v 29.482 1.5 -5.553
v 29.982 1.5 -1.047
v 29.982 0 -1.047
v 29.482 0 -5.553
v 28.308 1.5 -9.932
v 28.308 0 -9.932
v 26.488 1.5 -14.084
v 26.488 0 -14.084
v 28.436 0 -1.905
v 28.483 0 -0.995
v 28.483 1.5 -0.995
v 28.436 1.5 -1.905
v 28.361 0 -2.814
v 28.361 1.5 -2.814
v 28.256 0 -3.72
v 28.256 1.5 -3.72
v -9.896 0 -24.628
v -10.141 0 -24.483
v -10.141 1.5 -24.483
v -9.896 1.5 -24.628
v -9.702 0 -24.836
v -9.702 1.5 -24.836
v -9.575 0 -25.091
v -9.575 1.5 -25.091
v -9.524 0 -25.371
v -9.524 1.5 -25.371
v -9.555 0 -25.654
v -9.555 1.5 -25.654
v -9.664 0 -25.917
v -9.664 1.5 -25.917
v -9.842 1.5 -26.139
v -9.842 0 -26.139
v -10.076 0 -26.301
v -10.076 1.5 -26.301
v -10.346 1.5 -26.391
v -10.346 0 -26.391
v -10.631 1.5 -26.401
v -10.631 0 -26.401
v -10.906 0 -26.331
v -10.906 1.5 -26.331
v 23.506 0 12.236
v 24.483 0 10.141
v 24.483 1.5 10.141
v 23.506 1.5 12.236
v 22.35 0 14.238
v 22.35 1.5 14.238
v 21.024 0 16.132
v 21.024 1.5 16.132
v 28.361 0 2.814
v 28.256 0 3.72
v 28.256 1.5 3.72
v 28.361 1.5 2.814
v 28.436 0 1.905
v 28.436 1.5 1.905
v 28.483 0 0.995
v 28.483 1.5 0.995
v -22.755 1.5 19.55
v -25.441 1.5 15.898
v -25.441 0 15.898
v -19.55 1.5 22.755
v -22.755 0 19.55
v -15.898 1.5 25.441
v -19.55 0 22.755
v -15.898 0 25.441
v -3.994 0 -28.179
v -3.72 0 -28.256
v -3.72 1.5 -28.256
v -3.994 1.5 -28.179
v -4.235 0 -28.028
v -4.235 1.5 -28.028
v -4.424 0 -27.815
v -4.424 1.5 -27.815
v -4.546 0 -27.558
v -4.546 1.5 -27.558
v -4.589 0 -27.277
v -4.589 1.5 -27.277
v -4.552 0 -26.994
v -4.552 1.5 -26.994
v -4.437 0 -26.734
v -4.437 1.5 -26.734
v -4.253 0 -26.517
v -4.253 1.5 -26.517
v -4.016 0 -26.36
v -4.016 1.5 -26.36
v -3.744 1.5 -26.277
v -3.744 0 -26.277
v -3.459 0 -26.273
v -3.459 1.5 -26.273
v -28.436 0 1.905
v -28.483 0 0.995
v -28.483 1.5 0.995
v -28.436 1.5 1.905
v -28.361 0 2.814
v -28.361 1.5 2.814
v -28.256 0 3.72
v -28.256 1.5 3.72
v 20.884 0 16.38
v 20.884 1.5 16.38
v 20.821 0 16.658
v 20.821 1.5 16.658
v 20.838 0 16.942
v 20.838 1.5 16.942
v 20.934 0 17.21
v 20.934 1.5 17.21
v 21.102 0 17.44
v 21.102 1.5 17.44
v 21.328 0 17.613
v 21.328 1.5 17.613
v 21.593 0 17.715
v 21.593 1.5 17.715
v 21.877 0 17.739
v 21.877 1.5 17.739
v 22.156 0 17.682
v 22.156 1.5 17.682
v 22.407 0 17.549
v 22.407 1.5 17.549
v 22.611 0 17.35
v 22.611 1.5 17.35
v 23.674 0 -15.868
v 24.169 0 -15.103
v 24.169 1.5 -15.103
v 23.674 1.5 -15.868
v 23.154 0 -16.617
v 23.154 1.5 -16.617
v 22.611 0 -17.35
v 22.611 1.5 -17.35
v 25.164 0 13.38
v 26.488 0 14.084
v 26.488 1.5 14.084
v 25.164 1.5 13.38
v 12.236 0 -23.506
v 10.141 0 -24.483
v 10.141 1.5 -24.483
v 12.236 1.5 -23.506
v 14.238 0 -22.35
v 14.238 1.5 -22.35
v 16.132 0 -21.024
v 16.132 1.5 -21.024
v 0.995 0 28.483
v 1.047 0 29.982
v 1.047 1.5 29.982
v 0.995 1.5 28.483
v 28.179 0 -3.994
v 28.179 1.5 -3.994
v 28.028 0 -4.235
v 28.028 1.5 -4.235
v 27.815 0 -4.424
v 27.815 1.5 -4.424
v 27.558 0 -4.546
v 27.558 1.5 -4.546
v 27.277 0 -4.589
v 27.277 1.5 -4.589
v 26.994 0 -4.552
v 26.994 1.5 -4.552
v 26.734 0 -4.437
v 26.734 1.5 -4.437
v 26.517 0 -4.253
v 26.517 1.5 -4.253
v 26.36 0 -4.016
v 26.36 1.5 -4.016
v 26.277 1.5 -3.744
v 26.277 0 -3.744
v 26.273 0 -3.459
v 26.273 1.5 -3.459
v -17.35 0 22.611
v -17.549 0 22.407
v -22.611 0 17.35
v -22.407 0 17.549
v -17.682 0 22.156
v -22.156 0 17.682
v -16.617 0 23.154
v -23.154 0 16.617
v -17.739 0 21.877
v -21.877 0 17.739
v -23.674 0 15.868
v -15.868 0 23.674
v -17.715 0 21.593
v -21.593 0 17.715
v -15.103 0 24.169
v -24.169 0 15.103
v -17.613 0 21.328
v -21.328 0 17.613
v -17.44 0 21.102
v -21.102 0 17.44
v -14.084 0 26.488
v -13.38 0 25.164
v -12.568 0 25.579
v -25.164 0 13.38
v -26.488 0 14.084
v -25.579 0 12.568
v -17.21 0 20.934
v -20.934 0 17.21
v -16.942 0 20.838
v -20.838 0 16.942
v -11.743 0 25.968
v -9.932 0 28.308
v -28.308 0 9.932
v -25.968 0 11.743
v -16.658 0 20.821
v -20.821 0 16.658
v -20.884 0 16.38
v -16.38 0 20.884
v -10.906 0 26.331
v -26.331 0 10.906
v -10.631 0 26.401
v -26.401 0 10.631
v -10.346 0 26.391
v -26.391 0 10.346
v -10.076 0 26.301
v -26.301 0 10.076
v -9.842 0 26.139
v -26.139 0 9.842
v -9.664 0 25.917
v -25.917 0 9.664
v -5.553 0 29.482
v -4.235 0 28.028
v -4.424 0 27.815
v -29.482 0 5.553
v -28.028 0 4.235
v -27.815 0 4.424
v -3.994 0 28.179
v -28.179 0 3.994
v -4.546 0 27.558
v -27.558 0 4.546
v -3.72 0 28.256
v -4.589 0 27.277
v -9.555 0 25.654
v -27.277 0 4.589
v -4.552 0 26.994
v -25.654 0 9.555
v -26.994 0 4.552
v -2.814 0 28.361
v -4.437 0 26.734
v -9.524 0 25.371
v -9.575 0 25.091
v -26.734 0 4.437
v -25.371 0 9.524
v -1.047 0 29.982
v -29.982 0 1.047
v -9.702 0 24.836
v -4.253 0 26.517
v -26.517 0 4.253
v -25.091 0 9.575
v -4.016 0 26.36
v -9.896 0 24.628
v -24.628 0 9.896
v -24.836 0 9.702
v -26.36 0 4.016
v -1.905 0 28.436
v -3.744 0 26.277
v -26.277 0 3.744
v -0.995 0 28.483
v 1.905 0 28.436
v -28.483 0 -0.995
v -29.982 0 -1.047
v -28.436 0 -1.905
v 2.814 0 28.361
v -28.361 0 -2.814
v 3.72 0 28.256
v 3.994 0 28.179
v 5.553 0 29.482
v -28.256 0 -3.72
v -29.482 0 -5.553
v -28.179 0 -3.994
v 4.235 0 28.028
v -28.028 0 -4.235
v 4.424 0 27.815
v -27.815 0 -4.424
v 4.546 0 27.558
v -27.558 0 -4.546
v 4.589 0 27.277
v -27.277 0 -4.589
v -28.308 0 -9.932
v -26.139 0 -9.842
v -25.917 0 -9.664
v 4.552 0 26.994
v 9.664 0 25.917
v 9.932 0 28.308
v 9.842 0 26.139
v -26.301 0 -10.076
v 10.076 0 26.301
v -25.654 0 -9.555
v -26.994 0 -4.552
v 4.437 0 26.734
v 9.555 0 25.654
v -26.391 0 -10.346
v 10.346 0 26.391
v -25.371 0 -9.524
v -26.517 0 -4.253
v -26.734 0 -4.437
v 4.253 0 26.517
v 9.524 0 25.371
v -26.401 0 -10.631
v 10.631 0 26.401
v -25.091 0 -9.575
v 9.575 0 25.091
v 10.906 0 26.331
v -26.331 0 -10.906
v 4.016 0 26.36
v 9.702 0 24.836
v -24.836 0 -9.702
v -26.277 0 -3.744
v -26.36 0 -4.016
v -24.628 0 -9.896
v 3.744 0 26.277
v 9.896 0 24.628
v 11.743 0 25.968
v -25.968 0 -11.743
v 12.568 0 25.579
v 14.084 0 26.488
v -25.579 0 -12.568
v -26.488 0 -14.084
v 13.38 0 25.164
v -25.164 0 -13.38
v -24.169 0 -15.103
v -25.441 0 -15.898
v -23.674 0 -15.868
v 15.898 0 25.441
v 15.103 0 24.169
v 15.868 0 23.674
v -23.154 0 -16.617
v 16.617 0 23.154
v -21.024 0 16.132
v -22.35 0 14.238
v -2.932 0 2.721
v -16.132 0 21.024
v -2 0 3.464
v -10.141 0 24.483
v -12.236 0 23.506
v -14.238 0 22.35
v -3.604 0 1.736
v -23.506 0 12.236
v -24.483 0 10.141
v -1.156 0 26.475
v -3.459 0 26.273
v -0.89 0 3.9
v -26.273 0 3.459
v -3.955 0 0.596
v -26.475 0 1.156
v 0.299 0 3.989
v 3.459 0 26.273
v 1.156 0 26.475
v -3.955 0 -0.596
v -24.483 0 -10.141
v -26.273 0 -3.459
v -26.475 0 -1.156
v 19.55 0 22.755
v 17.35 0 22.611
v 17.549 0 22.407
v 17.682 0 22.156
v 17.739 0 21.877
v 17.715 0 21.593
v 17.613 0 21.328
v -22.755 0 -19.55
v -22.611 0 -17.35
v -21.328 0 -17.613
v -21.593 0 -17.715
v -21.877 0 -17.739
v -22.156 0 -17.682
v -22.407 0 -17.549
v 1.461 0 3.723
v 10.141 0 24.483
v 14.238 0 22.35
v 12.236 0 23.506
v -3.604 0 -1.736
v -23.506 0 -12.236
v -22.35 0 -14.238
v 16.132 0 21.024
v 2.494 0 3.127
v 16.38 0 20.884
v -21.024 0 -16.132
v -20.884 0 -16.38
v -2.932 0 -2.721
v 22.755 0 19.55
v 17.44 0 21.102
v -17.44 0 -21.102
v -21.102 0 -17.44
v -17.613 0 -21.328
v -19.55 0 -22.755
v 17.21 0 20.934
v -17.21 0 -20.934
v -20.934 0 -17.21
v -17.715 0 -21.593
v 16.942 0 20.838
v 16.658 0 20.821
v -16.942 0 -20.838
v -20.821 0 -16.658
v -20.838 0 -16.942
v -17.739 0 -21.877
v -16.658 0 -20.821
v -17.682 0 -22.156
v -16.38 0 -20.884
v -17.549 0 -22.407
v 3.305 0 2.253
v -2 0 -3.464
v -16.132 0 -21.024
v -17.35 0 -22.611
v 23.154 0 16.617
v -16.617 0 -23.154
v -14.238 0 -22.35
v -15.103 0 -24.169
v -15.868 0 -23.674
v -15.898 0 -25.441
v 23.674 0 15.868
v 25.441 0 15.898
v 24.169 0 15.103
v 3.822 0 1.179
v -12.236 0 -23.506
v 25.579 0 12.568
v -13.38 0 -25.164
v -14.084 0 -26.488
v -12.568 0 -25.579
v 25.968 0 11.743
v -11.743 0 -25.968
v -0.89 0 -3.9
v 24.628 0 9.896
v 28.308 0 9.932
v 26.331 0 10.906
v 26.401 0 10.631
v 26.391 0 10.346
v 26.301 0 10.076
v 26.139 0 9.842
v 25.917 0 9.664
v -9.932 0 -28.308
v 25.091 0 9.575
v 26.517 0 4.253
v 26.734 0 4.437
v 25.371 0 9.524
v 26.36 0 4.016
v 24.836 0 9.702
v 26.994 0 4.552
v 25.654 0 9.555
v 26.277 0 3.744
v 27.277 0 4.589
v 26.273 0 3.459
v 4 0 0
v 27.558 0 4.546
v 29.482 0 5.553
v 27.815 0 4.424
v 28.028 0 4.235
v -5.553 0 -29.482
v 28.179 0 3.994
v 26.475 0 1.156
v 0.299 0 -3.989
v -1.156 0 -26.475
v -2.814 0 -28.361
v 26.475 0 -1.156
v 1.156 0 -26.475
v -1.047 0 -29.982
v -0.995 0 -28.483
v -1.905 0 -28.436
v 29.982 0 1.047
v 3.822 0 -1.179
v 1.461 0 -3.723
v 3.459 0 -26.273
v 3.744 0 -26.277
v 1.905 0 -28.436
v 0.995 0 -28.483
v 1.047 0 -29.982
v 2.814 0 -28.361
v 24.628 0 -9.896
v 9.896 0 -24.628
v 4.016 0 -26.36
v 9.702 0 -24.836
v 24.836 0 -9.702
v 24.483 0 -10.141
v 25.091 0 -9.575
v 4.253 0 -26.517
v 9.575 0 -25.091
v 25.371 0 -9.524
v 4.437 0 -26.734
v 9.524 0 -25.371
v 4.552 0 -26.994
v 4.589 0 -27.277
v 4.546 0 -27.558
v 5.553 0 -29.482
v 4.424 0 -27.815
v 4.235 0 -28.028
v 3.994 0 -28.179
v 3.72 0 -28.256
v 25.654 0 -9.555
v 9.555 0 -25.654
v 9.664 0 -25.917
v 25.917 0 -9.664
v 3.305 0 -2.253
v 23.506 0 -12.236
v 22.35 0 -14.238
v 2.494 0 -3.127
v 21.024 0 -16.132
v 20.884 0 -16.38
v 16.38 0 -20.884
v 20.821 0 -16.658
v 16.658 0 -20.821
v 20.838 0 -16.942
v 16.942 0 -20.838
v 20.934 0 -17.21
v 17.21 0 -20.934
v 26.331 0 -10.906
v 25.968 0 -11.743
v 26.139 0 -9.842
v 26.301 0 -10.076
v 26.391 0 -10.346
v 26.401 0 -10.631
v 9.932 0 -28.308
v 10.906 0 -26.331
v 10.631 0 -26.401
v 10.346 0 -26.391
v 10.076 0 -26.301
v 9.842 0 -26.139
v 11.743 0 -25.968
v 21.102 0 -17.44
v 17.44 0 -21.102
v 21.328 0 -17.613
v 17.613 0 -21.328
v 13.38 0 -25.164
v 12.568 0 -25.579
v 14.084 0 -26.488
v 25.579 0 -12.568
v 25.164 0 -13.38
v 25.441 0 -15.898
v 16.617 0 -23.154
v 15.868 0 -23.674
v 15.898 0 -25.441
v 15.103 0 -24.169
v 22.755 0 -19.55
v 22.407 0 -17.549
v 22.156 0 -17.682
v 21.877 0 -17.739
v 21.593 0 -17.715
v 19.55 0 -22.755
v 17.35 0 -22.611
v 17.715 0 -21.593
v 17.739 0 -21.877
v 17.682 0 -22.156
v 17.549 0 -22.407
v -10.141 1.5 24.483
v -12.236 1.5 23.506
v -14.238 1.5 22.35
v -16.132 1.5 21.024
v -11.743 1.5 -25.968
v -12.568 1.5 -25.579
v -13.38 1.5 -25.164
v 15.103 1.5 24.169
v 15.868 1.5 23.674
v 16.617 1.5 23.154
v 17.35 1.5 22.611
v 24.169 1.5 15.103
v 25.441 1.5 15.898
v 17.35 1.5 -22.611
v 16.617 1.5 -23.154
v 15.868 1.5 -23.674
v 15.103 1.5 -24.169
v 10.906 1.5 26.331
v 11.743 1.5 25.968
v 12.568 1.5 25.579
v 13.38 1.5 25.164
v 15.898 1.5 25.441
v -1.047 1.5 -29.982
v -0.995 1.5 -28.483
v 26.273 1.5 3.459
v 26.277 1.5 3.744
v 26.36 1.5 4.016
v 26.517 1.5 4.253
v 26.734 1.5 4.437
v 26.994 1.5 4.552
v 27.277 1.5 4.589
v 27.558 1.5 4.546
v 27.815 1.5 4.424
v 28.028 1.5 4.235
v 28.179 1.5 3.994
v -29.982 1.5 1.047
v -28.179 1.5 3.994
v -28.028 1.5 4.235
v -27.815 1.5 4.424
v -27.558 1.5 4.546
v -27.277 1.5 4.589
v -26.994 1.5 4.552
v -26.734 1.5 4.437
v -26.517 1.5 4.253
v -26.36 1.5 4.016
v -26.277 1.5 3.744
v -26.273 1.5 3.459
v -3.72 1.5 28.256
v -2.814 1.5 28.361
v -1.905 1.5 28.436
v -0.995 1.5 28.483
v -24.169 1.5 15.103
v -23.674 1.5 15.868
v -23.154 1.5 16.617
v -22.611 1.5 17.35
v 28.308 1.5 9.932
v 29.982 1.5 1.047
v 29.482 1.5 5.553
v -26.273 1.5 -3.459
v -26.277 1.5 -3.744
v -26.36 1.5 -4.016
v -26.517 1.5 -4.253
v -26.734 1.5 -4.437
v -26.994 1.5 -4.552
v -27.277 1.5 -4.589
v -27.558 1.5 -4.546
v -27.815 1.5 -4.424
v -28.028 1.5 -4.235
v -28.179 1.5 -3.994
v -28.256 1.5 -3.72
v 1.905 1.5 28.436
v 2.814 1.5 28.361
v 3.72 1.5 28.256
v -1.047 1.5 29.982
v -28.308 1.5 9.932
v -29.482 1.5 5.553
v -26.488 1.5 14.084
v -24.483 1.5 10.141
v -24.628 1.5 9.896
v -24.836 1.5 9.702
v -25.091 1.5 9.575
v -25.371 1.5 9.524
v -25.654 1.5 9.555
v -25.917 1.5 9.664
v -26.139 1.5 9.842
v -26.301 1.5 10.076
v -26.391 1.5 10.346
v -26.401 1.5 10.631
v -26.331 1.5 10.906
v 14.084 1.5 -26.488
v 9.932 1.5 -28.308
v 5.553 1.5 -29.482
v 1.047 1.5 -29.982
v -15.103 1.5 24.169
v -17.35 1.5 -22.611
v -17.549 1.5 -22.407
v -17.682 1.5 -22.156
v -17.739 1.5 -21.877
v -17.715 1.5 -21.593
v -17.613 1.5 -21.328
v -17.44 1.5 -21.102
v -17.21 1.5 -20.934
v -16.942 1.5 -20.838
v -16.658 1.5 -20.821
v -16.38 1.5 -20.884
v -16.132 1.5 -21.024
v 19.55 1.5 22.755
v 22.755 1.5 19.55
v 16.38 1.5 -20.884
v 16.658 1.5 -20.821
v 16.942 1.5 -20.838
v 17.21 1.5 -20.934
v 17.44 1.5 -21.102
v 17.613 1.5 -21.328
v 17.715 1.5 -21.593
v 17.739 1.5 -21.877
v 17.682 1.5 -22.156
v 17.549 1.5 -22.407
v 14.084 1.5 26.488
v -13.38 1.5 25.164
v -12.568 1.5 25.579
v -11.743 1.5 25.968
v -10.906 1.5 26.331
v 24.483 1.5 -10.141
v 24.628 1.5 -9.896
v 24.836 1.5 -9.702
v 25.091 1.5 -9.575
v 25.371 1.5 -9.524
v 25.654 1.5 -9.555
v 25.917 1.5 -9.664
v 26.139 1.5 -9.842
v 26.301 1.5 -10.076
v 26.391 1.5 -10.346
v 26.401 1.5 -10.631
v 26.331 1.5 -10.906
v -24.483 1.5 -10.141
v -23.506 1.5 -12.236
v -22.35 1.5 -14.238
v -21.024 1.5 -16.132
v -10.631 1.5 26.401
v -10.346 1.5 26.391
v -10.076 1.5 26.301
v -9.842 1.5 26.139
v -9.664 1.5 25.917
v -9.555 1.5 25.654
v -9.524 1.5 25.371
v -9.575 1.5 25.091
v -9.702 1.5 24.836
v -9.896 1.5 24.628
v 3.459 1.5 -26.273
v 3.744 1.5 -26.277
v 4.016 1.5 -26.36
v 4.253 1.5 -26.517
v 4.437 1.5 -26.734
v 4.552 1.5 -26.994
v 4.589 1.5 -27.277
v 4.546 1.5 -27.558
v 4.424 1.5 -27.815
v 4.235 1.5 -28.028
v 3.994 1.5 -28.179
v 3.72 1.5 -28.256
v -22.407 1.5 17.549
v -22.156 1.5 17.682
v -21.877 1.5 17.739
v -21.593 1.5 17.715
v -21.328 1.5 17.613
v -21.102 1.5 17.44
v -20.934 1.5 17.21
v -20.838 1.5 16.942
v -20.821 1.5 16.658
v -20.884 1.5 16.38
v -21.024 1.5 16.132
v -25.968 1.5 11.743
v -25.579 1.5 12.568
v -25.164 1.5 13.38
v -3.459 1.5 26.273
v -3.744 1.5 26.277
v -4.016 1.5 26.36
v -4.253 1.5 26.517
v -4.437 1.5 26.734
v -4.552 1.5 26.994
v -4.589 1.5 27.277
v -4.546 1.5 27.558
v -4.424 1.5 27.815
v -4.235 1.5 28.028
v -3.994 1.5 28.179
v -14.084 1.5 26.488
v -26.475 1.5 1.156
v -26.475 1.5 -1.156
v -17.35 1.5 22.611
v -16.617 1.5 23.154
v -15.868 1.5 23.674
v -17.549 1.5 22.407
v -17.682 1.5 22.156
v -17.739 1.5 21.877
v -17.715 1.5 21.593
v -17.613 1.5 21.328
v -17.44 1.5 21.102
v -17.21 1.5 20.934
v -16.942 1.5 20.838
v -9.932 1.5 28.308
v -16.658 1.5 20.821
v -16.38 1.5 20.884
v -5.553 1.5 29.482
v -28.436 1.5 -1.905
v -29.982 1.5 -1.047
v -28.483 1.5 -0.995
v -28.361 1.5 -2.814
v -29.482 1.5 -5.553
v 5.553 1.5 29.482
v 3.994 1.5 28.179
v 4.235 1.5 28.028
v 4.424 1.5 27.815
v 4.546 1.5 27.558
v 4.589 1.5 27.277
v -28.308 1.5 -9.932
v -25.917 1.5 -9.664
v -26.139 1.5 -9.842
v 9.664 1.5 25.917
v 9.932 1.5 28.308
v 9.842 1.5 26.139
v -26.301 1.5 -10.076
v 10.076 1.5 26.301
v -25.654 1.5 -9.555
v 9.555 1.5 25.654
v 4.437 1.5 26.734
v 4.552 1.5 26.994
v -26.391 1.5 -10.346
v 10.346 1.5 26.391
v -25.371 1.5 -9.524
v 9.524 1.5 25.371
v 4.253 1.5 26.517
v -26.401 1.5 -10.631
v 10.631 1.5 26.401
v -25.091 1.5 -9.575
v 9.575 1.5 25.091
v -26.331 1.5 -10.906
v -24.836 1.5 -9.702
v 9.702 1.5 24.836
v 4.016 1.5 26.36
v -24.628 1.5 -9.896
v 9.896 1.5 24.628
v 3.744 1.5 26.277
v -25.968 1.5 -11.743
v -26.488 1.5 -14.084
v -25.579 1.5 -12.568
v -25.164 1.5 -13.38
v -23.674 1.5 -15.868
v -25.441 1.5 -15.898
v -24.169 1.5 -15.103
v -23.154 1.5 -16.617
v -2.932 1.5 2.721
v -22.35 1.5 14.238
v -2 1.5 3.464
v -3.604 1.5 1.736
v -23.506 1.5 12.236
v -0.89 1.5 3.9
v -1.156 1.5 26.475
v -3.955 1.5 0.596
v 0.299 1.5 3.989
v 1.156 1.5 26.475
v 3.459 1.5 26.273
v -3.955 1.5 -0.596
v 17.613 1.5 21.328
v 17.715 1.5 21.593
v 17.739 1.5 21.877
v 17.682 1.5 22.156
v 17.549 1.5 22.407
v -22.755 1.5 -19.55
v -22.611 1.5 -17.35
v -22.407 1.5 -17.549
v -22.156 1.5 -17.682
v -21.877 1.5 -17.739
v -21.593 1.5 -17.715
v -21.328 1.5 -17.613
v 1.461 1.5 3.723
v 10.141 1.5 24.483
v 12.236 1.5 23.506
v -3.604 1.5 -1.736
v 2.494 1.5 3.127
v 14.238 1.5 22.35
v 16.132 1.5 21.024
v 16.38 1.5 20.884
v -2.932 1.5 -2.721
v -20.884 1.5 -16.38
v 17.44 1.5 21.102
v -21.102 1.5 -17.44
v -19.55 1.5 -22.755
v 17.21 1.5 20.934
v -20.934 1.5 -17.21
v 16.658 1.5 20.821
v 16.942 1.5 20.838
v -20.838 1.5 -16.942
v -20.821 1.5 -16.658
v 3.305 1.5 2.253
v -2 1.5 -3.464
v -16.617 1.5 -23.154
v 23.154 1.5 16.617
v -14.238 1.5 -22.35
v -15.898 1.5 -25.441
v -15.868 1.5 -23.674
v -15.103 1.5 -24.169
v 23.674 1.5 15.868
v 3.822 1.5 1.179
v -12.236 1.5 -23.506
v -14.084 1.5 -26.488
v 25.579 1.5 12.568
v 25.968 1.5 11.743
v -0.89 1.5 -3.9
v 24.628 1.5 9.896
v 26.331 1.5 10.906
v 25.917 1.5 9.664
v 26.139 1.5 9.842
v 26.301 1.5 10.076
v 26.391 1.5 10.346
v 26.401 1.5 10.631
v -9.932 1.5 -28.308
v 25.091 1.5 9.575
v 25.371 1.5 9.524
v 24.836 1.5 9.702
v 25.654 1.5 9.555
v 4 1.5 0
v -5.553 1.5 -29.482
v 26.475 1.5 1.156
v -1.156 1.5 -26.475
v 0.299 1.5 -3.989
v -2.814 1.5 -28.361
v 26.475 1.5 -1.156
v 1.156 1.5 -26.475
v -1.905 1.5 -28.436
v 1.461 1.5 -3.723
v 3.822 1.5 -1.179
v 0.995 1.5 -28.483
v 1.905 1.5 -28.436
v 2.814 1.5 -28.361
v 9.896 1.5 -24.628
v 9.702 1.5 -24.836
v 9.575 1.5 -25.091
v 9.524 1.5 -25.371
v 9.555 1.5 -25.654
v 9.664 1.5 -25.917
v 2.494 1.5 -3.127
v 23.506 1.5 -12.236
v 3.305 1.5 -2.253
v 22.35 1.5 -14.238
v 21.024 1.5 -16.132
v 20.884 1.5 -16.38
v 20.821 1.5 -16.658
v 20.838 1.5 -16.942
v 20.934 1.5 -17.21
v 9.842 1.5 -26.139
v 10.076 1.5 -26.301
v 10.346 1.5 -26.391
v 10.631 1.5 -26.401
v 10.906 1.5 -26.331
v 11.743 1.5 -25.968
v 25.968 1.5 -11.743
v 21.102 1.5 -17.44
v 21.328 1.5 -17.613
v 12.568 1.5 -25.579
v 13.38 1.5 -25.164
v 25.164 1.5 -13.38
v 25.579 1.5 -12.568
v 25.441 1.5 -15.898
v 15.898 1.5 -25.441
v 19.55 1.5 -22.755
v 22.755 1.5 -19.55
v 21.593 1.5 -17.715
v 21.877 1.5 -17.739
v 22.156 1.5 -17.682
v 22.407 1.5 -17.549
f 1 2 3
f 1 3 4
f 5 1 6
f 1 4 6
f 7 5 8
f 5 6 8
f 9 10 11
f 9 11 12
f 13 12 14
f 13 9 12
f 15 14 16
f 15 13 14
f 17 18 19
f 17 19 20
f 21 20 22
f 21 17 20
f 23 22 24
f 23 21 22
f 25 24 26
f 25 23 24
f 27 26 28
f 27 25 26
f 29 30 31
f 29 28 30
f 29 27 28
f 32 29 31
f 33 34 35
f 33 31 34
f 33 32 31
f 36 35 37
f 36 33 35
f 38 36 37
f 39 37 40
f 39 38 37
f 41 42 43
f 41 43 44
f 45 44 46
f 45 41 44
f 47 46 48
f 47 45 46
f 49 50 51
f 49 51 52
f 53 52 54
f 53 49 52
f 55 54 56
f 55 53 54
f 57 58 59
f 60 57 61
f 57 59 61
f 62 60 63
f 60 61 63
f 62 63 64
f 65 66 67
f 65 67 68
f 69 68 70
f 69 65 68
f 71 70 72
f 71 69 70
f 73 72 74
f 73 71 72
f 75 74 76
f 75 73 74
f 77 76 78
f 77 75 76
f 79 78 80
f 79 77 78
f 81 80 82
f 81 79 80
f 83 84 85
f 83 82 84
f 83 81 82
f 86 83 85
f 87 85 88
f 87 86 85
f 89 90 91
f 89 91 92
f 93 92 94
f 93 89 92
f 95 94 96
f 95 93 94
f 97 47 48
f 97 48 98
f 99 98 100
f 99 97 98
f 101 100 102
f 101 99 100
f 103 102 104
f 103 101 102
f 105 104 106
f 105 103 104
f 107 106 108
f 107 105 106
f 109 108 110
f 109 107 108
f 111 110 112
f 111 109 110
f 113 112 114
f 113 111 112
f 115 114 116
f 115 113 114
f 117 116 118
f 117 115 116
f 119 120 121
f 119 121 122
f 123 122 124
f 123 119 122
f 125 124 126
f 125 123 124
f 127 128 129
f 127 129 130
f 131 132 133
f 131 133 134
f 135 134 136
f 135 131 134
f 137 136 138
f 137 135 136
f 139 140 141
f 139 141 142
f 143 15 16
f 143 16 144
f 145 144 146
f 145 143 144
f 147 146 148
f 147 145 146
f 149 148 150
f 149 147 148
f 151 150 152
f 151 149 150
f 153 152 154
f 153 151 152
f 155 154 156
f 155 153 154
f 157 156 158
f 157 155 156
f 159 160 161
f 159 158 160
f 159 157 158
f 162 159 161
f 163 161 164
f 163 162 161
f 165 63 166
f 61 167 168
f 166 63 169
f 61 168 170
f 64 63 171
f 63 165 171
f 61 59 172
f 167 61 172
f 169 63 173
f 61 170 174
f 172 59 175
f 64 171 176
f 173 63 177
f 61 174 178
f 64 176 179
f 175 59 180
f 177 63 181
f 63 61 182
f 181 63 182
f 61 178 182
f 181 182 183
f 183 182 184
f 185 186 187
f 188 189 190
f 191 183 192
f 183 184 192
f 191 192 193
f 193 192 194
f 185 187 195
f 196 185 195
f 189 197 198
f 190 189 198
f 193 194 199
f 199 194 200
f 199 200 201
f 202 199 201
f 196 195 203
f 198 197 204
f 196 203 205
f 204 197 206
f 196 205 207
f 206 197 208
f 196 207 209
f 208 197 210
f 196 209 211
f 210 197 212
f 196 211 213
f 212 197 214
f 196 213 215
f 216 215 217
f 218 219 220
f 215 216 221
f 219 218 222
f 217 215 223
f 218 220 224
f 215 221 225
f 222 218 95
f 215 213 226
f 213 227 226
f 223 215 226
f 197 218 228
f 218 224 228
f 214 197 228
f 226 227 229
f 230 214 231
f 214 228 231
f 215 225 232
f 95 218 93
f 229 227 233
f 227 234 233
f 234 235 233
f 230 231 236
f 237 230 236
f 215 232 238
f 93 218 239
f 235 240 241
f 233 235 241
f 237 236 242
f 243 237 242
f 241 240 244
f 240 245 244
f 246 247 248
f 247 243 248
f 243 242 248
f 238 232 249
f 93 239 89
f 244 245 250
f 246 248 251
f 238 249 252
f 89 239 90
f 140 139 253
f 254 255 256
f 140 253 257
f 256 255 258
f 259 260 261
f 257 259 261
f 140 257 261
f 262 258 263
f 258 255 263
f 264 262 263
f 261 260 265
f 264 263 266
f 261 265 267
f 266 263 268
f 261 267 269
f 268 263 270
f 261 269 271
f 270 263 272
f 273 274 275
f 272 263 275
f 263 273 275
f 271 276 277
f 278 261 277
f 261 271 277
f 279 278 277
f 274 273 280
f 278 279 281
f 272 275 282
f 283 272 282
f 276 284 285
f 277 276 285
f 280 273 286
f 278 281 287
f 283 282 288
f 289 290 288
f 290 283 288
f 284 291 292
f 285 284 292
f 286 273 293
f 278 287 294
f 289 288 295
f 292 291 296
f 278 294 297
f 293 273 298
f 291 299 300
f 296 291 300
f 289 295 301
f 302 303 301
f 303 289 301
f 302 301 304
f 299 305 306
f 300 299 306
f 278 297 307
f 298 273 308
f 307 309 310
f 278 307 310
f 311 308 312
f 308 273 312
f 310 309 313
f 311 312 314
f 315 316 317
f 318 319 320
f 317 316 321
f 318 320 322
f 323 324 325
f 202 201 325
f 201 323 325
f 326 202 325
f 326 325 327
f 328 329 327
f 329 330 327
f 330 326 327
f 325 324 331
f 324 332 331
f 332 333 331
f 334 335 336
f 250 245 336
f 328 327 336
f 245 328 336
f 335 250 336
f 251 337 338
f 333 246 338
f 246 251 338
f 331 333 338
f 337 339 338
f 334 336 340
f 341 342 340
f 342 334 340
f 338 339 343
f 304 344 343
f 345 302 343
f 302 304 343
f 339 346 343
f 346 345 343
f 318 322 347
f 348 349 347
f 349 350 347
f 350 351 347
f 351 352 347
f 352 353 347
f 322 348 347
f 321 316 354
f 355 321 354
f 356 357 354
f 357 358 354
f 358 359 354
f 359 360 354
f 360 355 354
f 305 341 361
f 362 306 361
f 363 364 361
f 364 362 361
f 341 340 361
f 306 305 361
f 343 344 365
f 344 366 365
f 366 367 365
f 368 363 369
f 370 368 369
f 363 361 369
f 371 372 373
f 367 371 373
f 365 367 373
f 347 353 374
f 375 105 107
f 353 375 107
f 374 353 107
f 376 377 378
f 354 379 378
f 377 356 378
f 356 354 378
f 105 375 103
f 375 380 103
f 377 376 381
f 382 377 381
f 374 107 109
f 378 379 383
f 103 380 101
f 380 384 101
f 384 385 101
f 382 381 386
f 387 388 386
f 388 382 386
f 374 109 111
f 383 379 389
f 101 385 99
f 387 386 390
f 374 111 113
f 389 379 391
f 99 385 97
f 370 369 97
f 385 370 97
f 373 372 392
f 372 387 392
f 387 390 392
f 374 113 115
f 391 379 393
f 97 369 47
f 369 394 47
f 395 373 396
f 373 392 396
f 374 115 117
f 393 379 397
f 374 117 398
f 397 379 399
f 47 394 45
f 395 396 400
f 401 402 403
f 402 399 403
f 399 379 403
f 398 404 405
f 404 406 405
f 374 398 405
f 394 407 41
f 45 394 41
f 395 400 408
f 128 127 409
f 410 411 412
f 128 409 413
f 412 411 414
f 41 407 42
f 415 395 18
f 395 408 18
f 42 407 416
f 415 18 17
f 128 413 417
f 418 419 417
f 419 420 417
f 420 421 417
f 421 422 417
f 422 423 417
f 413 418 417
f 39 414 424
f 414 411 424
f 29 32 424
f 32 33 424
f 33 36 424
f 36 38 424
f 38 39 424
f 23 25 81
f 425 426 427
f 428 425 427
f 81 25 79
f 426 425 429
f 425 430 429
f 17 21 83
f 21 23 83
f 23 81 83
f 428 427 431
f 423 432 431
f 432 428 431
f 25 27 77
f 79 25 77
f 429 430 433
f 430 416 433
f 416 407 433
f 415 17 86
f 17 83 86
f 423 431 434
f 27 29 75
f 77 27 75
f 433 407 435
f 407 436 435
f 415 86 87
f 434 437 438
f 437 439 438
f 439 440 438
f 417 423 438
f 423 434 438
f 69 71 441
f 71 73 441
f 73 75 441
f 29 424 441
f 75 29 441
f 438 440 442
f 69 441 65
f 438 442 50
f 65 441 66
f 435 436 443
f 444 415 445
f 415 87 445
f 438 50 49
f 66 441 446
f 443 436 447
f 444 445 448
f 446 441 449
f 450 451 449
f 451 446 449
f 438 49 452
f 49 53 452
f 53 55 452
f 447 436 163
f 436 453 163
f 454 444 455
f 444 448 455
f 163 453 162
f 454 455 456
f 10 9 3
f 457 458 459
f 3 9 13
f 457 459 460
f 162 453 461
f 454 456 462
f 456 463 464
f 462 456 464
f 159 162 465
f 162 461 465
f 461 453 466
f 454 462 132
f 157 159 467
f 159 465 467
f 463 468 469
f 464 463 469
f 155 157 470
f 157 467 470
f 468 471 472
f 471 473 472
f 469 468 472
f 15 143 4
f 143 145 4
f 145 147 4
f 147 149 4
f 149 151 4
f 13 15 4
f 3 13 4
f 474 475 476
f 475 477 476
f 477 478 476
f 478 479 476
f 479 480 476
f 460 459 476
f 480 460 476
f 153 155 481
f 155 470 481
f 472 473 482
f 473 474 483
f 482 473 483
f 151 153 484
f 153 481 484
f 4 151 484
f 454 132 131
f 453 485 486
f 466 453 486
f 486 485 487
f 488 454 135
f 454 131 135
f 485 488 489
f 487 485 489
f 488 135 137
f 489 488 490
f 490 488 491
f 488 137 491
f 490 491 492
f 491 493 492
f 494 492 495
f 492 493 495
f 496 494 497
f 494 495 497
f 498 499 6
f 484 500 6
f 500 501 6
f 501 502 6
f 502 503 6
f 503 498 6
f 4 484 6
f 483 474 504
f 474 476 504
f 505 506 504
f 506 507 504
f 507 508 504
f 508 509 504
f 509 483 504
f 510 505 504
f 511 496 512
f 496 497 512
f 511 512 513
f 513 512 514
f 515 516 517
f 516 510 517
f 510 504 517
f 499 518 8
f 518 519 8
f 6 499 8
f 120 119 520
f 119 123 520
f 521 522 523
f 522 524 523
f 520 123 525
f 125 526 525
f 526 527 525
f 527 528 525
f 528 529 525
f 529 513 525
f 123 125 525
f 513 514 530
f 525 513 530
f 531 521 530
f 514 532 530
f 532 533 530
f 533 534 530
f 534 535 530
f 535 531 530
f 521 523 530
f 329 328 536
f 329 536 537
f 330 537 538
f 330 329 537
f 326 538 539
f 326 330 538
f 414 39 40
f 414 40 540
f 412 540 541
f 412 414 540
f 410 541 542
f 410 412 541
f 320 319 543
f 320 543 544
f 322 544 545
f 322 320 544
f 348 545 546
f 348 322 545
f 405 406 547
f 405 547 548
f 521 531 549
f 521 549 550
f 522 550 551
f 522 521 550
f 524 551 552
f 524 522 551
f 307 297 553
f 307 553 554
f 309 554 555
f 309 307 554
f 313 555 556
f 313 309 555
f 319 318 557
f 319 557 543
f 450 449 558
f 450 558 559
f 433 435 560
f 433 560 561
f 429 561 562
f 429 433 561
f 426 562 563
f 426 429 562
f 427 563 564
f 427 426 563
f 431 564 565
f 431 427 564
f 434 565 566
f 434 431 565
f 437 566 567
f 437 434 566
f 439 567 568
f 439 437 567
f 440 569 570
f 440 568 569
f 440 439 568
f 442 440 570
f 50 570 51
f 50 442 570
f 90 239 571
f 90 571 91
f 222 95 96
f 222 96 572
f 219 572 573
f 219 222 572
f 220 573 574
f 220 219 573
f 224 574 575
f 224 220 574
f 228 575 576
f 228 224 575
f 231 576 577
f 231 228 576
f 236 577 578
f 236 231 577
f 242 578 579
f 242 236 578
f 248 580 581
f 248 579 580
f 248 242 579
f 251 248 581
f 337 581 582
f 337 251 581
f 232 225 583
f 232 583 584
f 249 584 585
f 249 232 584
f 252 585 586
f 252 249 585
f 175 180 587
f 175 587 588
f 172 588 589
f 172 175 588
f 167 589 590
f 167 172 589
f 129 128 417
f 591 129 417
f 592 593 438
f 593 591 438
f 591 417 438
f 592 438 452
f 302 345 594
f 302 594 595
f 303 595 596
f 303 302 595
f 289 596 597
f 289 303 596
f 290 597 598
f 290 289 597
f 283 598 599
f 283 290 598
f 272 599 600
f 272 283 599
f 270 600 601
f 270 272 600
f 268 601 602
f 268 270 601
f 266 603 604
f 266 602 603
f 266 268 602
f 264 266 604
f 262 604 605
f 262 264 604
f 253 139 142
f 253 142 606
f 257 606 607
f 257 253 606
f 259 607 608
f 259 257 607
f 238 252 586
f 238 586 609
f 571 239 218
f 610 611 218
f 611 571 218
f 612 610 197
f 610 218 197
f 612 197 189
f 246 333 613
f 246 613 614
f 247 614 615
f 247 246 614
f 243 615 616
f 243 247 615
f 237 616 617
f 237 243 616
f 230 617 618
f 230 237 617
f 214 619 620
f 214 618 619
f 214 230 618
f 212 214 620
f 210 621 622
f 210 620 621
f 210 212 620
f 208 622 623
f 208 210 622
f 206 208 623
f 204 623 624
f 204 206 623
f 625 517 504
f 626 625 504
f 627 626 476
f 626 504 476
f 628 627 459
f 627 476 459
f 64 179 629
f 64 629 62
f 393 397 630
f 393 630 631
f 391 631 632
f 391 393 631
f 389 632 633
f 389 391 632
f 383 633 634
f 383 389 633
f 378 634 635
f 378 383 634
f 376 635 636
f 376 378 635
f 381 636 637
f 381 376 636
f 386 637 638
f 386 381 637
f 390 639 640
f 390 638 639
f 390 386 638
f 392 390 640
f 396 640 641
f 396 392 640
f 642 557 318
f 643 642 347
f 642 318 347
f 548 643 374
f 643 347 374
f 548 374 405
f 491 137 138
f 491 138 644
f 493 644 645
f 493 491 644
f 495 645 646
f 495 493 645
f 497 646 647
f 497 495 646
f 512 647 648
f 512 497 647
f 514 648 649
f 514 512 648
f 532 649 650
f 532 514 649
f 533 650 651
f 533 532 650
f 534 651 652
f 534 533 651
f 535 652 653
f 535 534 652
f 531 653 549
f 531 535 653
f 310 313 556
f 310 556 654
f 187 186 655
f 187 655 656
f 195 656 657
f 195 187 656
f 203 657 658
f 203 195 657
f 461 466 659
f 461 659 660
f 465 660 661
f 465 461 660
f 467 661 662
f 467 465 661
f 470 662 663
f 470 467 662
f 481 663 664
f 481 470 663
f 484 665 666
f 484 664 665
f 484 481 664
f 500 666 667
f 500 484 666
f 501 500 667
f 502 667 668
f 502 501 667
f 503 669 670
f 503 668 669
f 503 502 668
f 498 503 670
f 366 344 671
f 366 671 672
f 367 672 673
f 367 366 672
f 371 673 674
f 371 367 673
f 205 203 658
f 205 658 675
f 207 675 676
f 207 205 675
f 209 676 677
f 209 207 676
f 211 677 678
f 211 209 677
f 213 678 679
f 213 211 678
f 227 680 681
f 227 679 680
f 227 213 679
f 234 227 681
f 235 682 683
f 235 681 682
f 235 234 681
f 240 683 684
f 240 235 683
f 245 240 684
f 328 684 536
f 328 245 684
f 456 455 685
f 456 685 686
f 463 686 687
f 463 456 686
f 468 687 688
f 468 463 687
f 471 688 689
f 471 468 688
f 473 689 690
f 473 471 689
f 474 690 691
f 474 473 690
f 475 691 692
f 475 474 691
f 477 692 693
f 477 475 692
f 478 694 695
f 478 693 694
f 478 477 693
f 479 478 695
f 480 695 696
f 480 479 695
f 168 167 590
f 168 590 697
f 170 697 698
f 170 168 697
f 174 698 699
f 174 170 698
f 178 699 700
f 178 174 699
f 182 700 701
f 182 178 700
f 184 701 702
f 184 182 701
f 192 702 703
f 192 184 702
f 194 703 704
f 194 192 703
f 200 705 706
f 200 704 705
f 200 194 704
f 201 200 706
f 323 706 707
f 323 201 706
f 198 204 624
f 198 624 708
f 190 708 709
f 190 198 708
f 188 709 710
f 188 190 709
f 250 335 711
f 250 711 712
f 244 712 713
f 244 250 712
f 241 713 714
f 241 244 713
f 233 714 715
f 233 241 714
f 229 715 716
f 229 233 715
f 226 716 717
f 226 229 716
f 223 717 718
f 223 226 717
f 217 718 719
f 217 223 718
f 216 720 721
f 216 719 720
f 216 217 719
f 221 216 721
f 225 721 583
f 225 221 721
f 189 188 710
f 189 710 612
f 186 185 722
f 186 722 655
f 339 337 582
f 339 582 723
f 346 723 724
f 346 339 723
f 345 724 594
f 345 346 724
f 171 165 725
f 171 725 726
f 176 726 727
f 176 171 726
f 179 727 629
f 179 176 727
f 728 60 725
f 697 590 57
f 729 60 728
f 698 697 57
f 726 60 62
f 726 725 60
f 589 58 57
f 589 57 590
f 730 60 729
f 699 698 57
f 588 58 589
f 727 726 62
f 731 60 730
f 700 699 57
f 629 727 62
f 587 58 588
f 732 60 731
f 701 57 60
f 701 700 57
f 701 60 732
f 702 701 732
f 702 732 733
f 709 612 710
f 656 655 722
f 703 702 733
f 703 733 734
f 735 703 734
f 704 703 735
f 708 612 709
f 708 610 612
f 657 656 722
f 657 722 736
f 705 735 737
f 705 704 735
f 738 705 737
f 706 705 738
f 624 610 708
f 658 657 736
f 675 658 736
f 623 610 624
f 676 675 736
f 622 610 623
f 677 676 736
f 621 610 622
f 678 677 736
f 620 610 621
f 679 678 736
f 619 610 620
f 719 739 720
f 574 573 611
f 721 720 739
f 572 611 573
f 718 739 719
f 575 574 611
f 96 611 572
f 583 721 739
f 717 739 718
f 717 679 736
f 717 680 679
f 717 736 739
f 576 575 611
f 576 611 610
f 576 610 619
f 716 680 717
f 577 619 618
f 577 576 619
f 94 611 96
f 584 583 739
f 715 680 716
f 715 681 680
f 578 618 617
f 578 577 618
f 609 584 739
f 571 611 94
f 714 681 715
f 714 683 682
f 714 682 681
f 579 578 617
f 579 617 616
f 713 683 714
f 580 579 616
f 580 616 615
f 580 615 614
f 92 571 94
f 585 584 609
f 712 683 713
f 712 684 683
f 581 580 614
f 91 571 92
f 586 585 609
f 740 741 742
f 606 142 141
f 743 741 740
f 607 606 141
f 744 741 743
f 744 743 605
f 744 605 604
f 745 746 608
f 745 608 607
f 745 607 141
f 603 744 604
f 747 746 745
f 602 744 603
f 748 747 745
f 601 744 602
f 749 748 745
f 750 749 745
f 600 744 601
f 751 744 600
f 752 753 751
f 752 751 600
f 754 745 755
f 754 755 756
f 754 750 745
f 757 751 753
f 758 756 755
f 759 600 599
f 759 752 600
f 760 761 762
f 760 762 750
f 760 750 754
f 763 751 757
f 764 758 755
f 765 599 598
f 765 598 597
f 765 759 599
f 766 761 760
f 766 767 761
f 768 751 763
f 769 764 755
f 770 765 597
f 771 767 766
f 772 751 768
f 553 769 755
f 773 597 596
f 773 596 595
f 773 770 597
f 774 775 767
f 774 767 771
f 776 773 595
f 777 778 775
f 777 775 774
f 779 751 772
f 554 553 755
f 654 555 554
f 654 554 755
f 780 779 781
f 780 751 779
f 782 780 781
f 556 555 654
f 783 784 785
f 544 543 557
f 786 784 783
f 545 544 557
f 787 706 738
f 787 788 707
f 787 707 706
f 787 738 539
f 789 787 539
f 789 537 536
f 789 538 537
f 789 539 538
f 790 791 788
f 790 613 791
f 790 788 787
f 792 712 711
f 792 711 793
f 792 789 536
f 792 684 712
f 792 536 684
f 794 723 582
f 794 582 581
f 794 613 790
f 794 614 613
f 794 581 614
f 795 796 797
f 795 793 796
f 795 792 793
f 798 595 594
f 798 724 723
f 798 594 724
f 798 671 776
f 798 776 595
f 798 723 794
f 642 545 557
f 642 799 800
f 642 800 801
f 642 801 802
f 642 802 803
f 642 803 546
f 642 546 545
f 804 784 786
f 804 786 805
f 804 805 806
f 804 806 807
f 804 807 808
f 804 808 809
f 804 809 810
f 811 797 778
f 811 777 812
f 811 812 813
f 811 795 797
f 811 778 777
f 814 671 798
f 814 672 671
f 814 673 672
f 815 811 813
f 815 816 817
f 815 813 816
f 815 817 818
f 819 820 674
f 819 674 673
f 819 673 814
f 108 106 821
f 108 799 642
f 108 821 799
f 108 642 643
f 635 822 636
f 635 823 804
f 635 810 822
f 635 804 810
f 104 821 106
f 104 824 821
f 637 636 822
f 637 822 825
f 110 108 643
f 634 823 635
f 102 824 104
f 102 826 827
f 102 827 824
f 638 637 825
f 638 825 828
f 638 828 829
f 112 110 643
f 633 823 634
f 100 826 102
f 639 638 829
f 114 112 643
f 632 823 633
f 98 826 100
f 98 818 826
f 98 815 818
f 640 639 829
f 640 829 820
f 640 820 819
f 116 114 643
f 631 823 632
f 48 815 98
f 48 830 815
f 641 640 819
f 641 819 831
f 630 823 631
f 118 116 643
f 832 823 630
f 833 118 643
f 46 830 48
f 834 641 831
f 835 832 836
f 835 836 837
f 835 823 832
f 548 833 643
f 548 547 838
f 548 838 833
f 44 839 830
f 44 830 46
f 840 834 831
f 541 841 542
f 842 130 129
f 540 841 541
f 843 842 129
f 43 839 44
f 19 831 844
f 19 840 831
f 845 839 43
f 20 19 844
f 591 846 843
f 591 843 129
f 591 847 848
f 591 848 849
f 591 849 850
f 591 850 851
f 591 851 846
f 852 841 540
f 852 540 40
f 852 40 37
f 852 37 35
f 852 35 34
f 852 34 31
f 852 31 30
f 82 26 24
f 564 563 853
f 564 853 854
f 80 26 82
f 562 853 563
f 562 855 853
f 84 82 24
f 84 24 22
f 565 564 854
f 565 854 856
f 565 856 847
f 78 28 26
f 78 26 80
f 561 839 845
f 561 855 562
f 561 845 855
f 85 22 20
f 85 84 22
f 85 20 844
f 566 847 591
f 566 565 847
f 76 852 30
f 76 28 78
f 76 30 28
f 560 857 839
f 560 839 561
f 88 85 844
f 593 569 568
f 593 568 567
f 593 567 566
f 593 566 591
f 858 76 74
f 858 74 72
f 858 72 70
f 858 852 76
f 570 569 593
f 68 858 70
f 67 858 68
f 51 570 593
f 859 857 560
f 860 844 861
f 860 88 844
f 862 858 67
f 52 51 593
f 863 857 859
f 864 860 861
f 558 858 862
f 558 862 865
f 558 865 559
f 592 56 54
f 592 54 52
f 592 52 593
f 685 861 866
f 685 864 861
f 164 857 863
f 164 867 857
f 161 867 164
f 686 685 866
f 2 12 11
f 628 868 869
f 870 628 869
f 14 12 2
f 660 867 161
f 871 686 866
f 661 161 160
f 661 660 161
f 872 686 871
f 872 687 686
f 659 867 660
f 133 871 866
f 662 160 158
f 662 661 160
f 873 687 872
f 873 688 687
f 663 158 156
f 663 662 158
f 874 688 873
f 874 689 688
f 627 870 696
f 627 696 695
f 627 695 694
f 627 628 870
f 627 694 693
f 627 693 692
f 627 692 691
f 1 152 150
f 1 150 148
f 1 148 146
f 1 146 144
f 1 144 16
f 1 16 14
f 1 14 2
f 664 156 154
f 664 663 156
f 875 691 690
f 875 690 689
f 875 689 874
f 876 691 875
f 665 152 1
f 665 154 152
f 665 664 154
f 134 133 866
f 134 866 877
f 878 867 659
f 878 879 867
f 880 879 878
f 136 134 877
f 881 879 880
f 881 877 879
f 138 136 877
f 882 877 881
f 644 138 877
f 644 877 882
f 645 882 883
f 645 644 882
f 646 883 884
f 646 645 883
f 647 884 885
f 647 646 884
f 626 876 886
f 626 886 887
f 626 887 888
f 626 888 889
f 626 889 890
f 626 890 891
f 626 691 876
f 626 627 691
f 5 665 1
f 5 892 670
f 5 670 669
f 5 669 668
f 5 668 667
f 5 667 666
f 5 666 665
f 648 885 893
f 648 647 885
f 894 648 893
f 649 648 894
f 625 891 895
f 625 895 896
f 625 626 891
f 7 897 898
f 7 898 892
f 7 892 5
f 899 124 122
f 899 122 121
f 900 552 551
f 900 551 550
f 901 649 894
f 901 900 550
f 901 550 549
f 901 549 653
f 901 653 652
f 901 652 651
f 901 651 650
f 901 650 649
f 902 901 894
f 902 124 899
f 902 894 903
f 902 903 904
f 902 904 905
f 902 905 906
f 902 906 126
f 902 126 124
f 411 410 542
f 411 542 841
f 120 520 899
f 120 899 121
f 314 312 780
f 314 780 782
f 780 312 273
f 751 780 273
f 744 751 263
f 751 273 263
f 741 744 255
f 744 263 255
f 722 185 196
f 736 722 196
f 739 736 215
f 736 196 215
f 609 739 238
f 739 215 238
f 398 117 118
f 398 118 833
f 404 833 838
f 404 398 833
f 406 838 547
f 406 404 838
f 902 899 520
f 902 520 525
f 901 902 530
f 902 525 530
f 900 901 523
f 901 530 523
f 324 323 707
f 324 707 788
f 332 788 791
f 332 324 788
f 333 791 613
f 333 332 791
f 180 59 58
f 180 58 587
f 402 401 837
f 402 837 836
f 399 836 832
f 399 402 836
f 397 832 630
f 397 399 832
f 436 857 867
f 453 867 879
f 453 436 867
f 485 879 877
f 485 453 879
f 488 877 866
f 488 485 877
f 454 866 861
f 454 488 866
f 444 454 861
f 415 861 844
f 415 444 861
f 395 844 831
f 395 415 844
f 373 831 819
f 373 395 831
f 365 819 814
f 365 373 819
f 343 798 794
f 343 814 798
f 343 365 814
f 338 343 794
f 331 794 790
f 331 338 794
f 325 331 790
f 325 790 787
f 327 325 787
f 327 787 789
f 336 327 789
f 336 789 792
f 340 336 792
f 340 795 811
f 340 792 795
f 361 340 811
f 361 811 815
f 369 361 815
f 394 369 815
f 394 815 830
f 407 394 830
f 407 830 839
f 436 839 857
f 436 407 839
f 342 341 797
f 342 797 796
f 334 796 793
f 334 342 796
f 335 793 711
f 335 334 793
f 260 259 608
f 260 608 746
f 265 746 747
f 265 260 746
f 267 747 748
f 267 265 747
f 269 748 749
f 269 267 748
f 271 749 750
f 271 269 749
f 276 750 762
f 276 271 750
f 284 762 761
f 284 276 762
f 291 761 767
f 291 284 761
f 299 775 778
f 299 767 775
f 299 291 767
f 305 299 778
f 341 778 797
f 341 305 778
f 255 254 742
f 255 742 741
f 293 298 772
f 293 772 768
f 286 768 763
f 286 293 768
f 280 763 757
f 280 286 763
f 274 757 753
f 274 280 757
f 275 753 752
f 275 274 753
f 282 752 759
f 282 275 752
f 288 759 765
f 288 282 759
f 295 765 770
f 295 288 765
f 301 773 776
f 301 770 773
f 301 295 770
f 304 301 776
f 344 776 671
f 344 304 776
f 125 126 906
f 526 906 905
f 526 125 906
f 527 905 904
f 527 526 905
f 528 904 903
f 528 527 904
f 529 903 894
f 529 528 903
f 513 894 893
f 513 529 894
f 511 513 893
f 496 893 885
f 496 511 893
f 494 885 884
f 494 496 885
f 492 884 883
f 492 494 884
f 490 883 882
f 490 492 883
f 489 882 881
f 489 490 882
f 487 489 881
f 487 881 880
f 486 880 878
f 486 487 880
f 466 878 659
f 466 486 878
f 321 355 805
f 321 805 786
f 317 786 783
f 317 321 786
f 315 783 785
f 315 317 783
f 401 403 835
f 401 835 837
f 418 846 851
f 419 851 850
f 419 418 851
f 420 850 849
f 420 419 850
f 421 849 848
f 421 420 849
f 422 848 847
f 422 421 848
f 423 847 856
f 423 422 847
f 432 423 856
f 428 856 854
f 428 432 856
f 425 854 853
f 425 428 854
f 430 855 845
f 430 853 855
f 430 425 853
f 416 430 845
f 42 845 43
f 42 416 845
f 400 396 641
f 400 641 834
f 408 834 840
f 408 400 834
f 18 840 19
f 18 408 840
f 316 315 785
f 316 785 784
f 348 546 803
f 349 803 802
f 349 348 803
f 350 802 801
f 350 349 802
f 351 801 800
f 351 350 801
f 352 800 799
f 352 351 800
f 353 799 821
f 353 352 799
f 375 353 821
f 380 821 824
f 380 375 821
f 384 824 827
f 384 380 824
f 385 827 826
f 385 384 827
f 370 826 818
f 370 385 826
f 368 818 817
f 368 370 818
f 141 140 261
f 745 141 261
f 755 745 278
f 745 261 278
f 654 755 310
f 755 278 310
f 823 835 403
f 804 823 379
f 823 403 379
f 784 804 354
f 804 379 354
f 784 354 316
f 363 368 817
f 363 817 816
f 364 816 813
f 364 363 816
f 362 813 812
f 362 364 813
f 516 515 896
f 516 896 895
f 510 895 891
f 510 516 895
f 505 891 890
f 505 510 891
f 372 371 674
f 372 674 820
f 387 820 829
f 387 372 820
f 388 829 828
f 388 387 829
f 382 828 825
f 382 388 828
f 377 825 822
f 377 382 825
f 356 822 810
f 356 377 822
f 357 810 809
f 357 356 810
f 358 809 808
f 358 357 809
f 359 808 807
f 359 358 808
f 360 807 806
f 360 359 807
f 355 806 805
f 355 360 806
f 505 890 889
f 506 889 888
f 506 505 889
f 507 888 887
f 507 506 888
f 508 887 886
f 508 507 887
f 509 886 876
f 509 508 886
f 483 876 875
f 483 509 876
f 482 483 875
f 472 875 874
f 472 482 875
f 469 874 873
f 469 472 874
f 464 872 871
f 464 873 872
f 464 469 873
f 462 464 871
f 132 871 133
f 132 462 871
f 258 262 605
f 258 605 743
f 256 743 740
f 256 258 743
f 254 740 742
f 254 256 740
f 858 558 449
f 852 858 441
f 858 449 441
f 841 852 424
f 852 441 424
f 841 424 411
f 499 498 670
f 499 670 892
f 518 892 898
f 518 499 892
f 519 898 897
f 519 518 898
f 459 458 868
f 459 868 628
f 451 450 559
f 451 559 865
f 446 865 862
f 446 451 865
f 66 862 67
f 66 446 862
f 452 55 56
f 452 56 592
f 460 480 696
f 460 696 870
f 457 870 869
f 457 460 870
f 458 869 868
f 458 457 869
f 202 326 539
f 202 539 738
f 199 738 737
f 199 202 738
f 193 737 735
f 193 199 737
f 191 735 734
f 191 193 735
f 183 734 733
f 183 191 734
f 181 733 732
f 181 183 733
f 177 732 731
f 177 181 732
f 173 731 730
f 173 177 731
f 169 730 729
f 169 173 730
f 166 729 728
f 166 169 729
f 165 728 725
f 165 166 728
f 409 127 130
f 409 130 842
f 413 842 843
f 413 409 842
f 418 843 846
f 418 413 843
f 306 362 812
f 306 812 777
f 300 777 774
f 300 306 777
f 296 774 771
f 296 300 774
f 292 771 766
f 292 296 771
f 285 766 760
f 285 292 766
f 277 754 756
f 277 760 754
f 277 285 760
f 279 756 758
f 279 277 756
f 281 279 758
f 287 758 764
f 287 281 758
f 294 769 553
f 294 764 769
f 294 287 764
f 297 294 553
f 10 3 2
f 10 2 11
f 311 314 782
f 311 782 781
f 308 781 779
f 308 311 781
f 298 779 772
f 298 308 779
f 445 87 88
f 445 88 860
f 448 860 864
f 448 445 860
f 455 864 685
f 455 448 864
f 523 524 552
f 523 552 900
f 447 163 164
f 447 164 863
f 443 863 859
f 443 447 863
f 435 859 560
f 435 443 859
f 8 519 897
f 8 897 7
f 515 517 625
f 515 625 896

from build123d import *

# Parameters (mm, degrees)
SKETCH1_R         = 30
WHEEL_BLANK_DEPTH = 1.5
T_SLOT_DEPTH      = 2.5
CIRPATTERN1_COUNT = 12
SKETCH3_R         = 4
CENTER_HOLE_DEPTH = 6


with BuildPart() as part:
    # Sketch1 → Wheel Blank (new body)
    with BuildSketch(Plane(origin=(0, 0, 0), x_dir=(1, 0, 0), z_dir=(0, 1, 0))):
        Circle(SKETCH1_R)
    extrude(amount=WHEEL_BLANK_DEPTH)

    # Sketch2 → T-Slot (cut, through all)
    with BuildSketch(Plane(origin=(0, 0, 0), x_dir=(1, 0, 0), z_dir=(0, 1, 0))):
        with BuildLine():
            Line((-1.046984901, 29.981724811), (-0.994635656, 28.48263857))
            ThreePointArc((-0.994635656, 28.48263857), (-2.360033914, 28.402116821), (-3.719996478, 28.256178549))
            ThreePointArc((-3.719996478, 28.256178549), (-4.580915147, 27.134207496), (-3.458944094, 26.273288826))
            ThreePointArc((-3.458944094, 26.273288826), (0, 26.5), (3.458944094, 26.273288826))
            ThreePointArc((3.458944094, 26.273288826), (4.580915147, 27.134207496), (3.719996478, 28.256178549))
            ThreePointArc((3.719996478, 28.256178549), (2.360033914, 28.402116821), (0.994635656, 28.48263857))
            Line((0.994635656, 28.48263857), (1.046984901, 29.981724811))
            ThreePointArc((1.046984901, 29.981724811), (0, 30), (-1.046984901, 29.981724811))
        make_face()
    t_slot = extrude(amount=T_SLOT_DEPTH, mode=Mode.SUBTRACT)

    # CirPattern1: T-Slot ×12 about axis
    cirpattern1_axis = Axis((0, 0, 0), (0, 1, 0))
    for i in range(1, CIRPATTERN1_COUNT):
        add(t_slot.rotate(cirpattern1_axis, i * 360 / CIRPATTERN1_COUNT), mode=Mode.SUBTRACT)

    # Sketch3 → Center Hole (cut)
    with BuildSketch(Plane(origin=(0, 0, 0), x_dir=(1, 0, 0), z_dir=(0, 1, 0))):
        Circle(SKETCH3_R)
    extrude(amount=CENTER_HOLE_DEPTH, mode=Mode.SUBTRACT)


solid = part.part
